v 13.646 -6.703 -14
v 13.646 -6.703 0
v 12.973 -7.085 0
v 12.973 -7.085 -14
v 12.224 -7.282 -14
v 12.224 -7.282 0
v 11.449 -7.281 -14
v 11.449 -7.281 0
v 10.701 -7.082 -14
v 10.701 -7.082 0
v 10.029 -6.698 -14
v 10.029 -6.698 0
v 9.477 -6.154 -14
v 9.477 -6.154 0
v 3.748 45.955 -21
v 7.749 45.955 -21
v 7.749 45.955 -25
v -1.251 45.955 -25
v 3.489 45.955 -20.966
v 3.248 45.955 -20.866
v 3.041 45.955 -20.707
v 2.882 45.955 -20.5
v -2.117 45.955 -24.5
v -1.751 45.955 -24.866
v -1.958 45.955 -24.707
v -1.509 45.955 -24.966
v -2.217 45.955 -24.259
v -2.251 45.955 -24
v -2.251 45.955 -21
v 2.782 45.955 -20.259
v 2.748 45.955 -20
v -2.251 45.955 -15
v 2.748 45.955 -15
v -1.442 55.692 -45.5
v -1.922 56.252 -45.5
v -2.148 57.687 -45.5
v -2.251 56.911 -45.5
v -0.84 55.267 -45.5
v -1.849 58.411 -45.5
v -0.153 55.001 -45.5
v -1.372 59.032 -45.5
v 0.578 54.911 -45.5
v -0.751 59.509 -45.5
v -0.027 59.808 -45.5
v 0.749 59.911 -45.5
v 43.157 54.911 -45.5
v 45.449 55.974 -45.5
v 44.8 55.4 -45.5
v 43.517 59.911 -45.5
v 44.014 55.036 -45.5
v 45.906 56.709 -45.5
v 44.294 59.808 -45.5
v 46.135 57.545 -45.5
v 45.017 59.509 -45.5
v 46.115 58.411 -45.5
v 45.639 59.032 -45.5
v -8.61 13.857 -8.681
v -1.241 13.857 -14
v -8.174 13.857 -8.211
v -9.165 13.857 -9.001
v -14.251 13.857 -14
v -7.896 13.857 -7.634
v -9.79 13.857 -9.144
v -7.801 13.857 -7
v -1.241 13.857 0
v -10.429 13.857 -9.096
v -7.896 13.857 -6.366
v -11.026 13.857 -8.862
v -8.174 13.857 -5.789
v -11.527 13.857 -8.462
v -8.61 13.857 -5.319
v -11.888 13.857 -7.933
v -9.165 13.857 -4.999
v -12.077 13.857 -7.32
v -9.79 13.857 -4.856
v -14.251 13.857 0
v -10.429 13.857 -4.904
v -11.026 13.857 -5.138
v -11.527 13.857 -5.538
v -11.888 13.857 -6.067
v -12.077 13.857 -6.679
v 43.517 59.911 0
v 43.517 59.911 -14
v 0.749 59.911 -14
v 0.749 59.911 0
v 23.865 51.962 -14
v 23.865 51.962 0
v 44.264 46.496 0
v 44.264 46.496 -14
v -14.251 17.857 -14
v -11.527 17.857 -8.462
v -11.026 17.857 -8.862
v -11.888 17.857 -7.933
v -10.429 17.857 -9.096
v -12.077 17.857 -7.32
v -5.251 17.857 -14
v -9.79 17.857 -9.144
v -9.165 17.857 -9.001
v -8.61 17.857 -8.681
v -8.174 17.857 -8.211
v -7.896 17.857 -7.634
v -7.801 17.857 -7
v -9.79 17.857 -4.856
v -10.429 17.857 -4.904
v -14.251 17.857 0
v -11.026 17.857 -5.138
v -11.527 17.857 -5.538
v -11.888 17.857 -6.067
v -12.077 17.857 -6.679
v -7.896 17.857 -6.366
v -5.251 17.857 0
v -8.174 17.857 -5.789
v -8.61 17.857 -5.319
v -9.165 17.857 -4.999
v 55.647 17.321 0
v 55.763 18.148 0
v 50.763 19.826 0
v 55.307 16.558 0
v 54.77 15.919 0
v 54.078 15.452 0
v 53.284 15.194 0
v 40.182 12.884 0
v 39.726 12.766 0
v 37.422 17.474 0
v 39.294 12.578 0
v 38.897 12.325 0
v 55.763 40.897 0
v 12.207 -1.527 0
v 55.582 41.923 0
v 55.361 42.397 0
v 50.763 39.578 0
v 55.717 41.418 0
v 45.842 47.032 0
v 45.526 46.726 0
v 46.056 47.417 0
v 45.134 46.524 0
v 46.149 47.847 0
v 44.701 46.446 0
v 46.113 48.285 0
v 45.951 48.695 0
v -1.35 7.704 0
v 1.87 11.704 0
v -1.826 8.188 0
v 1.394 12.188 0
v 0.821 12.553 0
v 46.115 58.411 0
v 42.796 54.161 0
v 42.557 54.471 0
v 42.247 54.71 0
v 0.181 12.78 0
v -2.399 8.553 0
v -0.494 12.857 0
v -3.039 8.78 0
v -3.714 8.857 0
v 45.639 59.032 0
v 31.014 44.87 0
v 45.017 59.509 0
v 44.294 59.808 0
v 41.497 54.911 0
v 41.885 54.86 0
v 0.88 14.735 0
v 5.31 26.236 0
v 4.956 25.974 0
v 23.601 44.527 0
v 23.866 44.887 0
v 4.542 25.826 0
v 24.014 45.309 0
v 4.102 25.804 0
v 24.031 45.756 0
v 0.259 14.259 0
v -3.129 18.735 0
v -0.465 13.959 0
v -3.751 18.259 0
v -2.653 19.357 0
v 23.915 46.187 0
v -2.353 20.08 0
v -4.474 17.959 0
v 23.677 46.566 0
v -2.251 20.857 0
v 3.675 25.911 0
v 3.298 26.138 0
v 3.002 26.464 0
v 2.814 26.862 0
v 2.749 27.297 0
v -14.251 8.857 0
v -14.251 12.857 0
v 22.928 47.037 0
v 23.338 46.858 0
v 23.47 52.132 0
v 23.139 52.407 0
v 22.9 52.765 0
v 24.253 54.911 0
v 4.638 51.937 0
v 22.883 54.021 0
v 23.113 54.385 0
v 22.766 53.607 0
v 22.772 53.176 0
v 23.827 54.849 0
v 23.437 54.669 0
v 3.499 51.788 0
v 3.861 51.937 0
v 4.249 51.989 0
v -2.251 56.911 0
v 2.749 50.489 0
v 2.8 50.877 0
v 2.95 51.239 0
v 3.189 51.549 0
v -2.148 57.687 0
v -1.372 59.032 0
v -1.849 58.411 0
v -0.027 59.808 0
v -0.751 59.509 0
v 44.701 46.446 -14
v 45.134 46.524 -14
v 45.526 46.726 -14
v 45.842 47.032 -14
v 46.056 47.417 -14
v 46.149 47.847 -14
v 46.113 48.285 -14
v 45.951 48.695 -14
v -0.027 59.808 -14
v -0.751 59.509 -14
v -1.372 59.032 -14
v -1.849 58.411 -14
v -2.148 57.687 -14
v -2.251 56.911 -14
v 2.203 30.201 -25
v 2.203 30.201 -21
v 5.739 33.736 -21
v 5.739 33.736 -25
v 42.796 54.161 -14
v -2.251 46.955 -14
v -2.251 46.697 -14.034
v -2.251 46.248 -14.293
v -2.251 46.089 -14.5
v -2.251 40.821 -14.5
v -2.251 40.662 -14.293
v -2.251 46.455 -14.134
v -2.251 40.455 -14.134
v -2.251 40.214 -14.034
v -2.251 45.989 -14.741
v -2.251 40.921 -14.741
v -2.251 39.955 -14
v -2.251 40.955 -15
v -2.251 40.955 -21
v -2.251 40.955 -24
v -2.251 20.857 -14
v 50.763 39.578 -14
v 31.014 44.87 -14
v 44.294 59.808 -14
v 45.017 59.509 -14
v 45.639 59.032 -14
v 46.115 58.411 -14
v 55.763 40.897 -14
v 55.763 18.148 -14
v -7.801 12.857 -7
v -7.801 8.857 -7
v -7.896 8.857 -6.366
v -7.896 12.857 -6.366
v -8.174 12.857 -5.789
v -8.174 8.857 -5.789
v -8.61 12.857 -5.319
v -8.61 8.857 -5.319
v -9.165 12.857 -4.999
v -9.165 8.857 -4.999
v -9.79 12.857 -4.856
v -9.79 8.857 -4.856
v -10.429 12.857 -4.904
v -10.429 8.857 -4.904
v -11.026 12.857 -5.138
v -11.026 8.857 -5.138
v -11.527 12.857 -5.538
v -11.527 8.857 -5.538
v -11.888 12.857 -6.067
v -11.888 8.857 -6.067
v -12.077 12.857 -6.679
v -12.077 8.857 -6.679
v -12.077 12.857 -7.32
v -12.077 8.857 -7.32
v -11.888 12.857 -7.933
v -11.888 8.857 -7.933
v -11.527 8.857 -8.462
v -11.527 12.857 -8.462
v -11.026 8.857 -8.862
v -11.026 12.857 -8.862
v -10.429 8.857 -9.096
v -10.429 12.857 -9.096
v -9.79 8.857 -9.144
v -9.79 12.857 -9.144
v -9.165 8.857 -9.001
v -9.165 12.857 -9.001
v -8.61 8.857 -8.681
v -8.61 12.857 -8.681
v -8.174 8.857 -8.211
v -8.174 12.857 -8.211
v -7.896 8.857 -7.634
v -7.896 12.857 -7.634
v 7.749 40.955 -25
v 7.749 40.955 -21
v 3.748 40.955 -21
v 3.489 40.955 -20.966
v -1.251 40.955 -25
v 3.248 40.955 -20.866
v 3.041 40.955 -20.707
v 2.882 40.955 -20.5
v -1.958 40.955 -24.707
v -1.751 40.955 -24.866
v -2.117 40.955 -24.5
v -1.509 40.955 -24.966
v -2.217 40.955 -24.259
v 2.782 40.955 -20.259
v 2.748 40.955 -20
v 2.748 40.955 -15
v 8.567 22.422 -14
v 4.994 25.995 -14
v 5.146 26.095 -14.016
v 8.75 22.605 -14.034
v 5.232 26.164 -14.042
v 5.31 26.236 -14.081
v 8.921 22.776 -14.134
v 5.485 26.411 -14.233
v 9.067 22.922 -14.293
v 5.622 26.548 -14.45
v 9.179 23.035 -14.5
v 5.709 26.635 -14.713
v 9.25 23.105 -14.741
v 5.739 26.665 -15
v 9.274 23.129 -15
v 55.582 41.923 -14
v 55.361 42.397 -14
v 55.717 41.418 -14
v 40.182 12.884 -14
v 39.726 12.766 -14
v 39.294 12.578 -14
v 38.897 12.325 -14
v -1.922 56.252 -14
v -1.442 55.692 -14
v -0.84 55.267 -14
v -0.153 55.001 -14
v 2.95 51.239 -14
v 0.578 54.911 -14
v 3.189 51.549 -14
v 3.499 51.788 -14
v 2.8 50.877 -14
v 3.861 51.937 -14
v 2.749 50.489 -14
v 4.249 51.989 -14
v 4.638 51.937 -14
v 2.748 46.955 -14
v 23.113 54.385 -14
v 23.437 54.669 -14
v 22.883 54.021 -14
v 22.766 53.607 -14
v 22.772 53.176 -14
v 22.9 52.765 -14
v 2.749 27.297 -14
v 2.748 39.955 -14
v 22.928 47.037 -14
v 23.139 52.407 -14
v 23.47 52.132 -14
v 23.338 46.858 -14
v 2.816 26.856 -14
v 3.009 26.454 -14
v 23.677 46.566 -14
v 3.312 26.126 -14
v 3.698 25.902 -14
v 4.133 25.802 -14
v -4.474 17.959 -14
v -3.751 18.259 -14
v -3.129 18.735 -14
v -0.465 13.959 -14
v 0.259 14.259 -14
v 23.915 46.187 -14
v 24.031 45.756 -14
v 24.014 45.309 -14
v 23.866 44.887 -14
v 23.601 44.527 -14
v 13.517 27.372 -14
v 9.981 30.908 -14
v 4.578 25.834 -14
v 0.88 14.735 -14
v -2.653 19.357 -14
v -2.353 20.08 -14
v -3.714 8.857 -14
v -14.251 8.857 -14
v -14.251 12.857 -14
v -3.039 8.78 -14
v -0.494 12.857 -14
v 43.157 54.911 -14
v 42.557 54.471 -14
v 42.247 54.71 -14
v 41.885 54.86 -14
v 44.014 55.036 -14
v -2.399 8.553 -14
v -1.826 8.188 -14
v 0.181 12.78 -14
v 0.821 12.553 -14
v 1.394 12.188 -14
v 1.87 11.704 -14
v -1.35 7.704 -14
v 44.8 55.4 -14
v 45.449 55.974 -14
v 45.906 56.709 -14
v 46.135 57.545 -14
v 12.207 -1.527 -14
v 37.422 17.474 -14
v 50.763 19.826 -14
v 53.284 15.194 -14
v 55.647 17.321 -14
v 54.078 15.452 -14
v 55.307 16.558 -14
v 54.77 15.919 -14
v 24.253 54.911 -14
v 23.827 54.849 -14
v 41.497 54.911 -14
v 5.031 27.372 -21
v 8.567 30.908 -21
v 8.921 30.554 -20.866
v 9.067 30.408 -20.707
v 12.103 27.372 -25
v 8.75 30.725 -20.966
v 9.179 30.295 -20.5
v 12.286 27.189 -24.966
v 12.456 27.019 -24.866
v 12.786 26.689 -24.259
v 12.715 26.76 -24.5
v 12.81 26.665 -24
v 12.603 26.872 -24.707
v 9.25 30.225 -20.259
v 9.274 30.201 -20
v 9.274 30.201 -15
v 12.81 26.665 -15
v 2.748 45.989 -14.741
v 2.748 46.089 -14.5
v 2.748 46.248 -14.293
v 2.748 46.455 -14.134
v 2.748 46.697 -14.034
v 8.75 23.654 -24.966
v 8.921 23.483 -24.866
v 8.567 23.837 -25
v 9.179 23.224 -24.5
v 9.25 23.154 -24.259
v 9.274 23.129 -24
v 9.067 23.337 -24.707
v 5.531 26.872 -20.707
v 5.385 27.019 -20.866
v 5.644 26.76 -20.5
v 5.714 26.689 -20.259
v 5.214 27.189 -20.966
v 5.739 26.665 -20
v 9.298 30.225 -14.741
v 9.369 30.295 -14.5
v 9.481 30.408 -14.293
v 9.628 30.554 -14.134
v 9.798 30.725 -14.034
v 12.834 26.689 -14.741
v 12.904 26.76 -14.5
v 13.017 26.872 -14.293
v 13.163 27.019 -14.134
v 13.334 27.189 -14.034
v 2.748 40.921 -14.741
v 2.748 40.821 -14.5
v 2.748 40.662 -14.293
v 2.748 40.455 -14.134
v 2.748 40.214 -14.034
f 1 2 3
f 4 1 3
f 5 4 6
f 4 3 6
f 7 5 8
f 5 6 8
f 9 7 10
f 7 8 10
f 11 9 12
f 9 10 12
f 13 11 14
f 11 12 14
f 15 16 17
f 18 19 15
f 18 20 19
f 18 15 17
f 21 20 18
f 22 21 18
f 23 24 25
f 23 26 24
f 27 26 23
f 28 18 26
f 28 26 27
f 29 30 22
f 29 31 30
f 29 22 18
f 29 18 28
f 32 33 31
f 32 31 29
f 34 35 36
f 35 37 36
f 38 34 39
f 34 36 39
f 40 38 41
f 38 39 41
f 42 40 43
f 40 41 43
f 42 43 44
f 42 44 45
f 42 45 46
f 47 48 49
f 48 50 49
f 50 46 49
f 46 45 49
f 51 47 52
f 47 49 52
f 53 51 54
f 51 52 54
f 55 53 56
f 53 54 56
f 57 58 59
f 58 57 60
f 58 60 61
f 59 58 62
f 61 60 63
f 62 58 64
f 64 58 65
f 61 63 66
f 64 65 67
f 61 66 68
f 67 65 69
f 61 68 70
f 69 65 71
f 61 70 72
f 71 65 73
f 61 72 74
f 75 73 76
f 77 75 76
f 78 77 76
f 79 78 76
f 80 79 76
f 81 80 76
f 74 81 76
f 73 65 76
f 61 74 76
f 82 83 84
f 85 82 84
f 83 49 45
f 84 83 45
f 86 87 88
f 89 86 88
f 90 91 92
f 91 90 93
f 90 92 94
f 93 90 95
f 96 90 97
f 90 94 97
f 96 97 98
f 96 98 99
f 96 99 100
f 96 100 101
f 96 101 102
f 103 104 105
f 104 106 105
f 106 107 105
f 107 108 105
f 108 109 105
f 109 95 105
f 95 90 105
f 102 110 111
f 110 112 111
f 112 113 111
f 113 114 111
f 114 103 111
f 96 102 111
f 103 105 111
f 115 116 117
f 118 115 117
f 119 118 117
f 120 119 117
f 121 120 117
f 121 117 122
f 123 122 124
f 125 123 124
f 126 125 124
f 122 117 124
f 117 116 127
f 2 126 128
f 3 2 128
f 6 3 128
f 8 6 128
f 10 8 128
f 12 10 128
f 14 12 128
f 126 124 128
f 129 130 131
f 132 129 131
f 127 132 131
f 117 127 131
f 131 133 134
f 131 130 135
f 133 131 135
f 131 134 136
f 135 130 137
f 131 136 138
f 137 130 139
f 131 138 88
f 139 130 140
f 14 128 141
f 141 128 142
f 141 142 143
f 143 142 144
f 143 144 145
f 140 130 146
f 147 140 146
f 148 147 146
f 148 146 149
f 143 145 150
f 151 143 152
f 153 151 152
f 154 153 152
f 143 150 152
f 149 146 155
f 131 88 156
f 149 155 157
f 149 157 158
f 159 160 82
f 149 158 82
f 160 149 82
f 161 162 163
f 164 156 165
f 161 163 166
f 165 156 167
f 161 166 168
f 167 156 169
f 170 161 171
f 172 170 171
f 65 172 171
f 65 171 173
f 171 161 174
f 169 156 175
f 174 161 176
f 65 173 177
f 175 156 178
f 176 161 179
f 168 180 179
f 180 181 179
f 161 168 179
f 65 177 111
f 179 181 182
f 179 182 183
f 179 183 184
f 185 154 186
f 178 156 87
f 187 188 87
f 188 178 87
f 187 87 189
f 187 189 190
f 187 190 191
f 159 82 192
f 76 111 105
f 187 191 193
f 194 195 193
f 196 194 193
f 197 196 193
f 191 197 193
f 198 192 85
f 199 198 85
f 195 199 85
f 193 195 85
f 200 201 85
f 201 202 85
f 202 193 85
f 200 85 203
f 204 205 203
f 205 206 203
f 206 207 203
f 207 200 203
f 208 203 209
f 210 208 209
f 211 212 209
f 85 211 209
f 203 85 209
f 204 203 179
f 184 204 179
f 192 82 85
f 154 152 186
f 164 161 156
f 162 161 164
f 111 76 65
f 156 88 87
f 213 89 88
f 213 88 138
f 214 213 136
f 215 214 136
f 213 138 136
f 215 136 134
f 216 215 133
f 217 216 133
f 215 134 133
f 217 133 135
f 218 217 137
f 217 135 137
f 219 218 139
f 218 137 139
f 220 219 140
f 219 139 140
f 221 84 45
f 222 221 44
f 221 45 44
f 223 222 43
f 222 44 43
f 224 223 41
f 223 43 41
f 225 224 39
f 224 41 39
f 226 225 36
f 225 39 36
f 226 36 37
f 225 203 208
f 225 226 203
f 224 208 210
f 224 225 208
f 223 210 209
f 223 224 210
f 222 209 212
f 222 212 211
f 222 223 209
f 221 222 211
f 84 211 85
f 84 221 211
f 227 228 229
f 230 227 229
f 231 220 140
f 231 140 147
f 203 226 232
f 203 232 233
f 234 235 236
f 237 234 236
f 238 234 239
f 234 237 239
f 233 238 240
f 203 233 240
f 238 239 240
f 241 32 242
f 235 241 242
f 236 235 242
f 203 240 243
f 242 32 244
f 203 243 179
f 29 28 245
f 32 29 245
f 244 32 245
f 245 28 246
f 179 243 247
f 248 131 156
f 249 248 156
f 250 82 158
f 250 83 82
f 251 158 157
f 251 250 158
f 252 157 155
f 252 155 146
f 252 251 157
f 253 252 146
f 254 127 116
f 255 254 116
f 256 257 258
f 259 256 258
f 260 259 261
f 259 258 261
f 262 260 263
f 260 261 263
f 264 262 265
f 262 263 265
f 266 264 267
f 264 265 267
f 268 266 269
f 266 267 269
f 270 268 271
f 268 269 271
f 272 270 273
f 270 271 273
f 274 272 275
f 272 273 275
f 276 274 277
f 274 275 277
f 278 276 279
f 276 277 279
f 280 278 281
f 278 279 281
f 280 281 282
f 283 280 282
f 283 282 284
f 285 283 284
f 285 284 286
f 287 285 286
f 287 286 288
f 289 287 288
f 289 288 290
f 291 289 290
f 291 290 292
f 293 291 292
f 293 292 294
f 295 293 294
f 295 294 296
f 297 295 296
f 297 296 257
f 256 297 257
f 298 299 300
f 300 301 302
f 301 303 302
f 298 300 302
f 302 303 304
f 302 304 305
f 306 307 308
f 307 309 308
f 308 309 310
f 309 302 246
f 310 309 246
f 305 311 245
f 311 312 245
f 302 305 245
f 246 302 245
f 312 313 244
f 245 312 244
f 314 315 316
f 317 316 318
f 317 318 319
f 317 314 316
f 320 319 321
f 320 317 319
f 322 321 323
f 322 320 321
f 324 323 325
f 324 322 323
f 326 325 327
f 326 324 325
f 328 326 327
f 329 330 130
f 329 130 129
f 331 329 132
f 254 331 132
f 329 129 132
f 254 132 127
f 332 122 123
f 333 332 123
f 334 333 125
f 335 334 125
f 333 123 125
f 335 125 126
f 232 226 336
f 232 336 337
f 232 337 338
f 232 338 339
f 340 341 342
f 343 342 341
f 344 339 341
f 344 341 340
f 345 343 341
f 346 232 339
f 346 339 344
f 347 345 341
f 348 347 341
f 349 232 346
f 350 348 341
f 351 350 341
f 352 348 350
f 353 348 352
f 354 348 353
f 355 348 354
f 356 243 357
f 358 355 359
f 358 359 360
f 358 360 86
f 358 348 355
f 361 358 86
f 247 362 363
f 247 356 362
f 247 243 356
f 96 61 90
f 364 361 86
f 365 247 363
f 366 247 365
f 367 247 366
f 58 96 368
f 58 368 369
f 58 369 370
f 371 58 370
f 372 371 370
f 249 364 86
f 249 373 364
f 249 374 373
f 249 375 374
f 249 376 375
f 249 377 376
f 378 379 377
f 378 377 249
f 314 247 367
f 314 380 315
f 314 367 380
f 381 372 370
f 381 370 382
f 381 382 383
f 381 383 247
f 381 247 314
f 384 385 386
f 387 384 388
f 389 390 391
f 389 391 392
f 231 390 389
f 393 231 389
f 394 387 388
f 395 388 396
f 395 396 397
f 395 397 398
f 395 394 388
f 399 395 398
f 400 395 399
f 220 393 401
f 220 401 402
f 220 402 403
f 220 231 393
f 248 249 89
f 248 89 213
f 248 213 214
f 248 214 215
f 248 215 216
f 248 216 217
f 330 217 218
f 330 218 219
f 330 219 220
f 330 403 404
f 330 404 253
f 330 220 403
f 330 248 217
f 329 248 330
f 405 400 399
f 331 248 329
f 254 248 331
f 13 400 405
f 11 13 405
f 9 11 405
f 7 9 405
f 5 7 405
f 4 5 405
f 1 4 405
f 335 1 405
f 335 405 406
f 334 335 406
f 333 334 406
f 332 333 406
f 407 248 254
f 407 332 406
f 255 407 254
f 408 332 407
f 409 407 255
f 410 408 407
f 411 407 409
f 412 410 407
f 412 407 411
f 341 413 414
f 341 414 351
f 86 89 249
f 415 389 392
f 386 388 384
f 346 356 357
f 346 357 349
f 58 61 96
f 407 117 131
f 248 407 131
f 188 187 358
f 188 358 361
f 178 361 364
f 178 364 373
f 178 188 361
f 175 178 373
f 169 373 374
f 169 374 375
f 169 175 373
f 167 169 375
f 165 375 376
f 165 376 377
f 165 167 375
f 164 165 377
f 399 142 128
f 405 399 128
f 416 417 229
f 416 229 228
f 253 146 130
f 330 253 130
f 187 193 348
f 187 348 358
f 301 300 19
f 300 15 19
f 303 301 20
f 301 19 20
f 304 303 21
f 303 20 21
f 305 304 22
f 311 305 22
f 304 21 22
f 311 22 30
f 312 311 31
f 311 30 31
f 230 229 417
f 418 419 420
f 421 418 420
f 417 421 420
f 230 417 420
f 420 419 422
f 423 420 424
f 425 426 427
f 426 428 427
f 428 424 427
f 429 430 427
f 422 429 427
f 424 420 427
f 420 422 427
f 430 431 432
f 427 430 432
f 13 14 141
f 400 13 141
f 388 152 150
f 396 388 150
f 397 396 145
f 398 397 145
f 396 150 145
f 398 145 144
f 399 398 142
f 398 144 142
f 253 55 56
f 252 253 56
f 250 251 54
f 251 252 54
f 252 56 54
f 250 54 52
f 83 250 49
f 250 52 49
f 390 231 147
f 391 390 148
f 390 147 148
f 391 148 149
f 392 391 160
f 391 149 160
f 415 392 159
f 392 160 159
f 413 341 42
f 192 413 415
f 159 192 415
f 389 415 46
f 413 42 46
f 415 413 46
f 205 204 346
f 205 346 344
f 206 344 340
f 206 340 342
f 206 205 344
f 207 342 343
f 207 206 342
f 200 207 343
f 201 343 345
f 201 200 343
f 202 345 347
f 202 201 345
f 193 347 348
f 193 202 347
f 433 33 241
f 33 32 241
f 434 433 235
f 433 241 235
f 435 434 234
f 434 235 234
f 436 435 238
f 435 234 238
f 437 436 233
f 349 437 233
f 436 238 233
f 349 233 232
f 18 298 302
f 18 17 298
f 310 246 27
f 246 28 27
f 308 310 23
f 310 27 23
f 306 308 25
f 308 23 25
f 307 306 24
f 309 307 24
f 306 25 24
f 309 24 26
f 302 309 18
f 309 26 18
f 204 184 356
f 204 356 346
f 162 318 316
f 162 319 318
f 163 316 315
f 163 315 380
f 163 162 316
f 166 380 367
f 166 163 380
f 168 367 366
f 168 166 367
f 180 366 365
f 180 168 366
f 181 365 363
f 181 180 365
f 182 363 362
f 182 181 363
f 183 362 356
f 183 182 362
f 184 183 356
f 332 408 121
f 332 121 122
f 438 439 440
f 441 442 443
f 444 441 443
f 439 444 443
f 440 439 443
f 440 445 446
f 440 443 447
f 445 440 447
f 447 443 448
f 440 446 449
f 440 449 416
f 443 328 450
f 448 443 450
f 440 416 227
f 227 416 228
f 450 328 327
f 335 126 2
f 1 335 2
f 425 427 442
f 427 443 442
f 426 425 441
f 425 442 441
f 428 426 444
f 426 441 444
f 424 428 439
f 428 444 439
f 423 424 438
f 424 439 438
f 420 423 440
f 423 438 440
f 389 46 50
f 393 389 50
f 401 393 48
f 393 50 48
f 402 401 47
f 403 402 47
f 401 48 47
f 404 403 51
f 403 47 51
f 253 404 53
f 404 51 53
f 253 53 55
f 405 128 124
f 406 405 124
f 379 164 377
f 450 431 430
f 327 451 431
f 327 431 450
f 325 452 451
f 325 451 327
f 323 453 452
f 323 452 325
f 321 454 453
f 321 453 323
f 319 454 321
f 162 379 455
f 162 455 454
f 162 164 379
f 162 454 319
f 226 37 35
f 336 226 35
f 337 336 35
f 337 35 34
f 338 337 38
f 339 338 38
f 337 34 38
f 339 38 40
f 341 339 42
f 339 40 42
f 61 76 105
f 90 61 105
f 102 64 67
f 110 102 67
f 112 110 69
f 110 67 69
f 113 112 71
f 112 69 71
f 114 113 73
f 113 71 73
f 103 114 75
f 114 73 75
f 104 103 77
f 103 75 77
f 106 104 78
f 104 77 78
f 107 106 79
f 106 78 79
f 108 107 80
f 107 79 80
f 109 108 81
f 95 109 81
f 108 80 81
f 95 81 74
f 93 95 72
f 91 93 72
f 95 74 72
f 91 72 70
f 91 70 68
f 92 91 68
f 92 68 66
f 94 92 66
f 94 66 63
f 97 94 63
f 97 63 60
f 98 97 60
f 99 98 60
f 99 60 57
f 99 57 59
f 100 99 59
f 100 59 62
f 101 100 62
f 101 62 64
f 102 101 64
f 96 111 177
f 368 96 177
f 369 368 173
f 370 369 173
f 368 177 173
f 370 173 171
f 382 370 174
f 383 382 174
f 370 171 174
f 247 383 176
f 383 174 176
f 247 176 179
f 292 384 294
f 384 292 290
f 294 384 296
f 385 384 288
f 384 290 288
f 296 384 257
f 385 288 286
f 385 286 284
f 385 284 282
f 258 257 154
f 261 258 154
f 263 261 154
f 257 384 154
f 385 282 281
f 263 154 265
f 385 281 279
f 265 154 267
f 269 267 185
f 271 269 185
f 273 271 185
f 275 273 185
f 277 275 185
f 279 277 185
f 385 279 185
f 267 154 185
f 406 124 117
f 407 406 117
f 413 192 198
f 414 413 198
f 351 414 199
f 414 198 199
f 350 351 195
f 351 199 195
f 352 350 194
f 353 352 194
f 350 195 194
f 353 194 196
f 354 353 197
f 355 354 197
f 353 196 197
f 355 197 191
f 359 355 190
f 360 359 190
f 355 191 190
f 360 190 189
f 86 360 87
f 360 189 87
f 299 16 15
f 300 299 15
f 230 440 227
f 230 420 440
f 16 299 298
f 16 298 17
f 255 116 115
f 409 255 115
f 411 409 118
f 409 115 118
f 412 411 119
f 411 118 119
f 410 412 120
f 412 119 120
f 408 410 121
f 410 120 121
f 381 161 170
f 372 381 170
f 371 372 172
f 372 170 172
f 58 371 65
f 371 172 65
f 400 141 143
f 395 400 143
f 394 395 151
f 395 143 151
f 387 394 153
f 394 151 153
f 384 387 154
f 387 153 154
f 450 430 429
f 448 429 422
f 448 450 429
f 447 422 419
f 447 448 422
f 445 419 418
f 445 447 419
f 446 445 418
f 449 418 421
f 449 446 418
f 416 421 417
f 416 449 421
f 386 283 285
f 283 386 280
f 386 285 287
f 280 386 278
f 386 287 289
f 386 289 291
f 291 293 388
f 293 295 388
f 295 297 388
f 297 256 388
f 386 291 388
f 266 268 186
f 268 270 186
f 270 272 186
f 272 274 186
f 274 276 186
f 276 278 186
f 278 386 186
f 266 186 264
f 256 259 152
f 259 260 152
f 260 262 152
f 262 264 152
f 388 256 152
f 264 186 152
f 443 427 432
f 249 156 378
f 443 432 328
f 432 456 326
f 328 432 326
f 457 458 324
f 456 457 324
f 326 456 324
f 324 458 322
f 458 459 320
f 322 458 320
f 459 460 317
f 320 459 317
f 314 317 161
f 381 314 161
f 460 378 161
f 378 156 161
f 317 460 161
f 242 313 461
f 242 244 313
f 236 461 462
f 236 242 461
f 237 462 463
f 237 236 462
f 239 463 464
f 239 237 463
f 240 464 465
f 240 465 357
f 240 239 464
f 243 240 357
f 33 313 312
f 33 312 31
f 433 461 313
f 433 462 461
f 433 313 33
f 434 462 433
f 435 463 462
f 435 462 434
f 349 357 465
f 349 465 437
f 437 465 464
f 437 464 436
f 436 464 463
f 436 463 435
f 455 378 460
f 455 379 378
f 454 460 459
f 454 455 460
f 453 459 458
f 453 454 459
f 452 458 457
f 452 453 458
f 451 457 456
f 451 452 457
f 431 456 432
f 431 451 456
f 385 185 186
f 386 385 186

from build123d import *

# Parameters (mm, degrees)
BOSS_EXTRUDE1_DEPTH = 14
FILLET1_R           = 3
SKETCH2_R           = 2.149999998
CUT_EXTRUDE1_DEPTH  = 20
BOSS_EXTRUDE2_START = 31.5
BOSS_EXTRUDE2_DEPTH = 31.5
FILLET2_R           = 3
SKETCH4_W           = 4.998300131
SKETCH4_H           = 5
BOSS_EXTRUDE3_DEPTH = 7
SKETCH5_W           = 10
SKETCH5_H           = 5
BOSS_EXTRUDE4_DEPTH = 4
FILLET3_R           = 1


with BuildPart() as part:
    # Sketch1 → Boss-Extrude1 (new body)
    with BuildSketch(Plane.XY):
        with BuildLine():
            Line((-1.241250307, 13.85672555), (-14.250633986, 13.85672555))
            Line((-14.250633986, 13.85672555), (-14.250633986, 17.85672555))
            Line((-14.250633986, 17.85672555), (-5.250633986, 17.85672555))
            ThreePointArc((-5.250633986, 17.85672555), (-3.129313642, 18.735405207), (-2.250633986, 20.85672555))
            Line((-2.250633986, 20.85672555), (-2.250633986, 59.910721228))
            Line((-2.250633986, 59.910721228), (-0.250633986, 59.910721228))
            Line((-0.250633986, 59.910721228), (45.249366014, 59.910721228))
            Line((45.249366014, 59.910721228), (55.360948415, 42.396946765))
            ThreePointArc((55.360948415, 42.396946765), (55.660649682, 41.673403901), (55.762872203, 40.896946765))
            Line((55.762872203, 40.896946765), (55.762872203, 18.148173952))
            ThreePointArc((55.762872203, 18.148173952), (55.061005533, 16.219811123), (53.283816736, 15.193750693))
            Line((53.283816736, 15.193750693), (40.181909711, 12.883530985))
            ThreePointArc((40.181909711, 12.883530985), (39.506607037, 12.680287949), (38.897409174, 12.325014256))
            Line((38.897409174, 12.325014256), (13.646499049, -6.702911338))
            ThreePointArc((13.646499049, -6.702911338), (11.449475402, -7.281339392), (9.477021718, -6.153989234))
            Line((9.477021718, -6.153989234), (-1.349799491, 7.703709976))
            ThreePointArc((-1.349799491, 7.703709976), (-2.398718311, 8.553107689), (-3.713831752, 8.85672555))
            Line((-3.713831752, 8.85672555), (-14.250633986, 8.85672555))
            Line((-14.250633986, 8.85672555), (-14.250633986, 12.85672555))
            Line((-14.250633986, 12.85672555), (-3.093333978, 12.85672555))
            Line((-3.093333978, 12.85672555), (-0.493883182, 12.85672555))
            ThreePointArc((-0.493883182, 12.85672555), (0.821230258, 12.553107689), (1.870149079, 11.703709976))
            Line((1.870149079, 11.703709976), (12.207057793, -1.526929835))
            Line((12.207057793, -1.526929835), (37.422217436, 17.474055838))
            Line((37.422217436, 17.474055838), (50.762872203, 19.826373214))
            Line((50.762872203, 19.826373214), (50.762872203, 39.578259723))
            Line((50.762872203, 39.578259723), (31.01448812, 44.86982329))
            Line((31.01448812, 44.86982329), (15.607892966, 29.463228136))
            Line((15.607892966, 29.463228136), (0.880070037, 14.735405207))
            ThreePointArc((0.880070037, 14.735405207), (-0.09320001, 14.085086953), (-1.241250307, 13.85672555))
        make_face()
        with BuildLine():
            Line((45.951332722, 48.694879226), (42.79562737, 54.160721228))
            ThreePointArc((42.79562737, 54.160721228), (42.246589264, 54.709759334), (41.496589264, 54.910721228))
            Line((41.496589264, 54.910721228), (24.253494556, 54.910721228))
            ThreePointArc((24.253494556, 54.910721228), (22.766327264, 53.606510517), (23.865265988, 51.961832489))
            Line((23.865265988, 51.961832489), (44.264066048, 46.495990486))
            ThreePointArc((44.264066048, 46.495990486), (45.842324626, 47.031737082), (45.951332722, 48.694879226))
        make_face(mode=Mode.SUBTRACT)
        with BuildLine():
            Line((23.600595455, 44.526998437), (5.310026186, 26.236429168))
            ThreePointArc((5.310026186, 26.236429168), (3.675340866, 25.911270041), (2.749366014, 27.29708934))
            Line((2.749366014, 27.29708934), (2.749366014, 50.488601873))
            ThreePointArc((2.749366014, 50.488601873), (3.336223871, 51.678631883), (4.637594582, 51.937490612))
            Line((4.637594582, 51.937490612), (22.92816385, 47.036547348))
            ThreePointArc((22.92816385, 47.036547348), (23.988824022, 45.975887176), (23.600595455, 44.526998437))
        make_face(mode=Mode.SUBTRACT)
    extrude(amount=-BOSS_EXTRUDE1_DEPTH)

    # Fillet1
    fillet1_edges = [part.edges().sort_by_distance(p)[0] for p in [
        (-2.250633986, 59.910721228, -7),
        (45.249366014, 59.910721228, -7),
    ]]
    fillet(fillet1_edges, radius=FILLET1_R)

    # Sketch2 → Cut-Extrude1 (cut)
    with BuildSketch(Plane.XZ.offset(-8.85672555)):
        with Locations((-9.950633986, -6.999923237)):
            Circle(SKETCH2_R)
    extrude(amount=-CUT_EXTRUDE1_DEPTH, mode=Mode.SUBTRACT)

    # Sketch3 → Boss-Extrude2 (add)
    with BuildSketch(Plane(origin=(0, 0, -14), x_dir=(-1, 0, 0), z_dir=(0, 0, -1)).offset(BOSS_EXTRUDE2_START)):
        with BuildLine():
            Line((-43.517315207, 59.910721228), (-0.749366014, 59.910721228))
            ThreePointArc((-0.749366014, 59.910721228), (1.371954329, 59.032041572), (2.250633986, 56.910721228))
            Line((2.250633986, 56.910721228), (2.250633986, 54.910721228))
            Line((2.250633986, 54.910721228), (-48.13611736, 54.910721228))
            Line((-48.13611736, 54.910721228), (-46.115391418, 58.410721228))
            ThreePointArc((-46.115391418, 58.410721228), (-45.017315207, 59.50879744), (-43.517315207, 59.910721228))
        make_face()
    extrude(amount=-BOSS_EXTRUDE2_DEPTH)

    # Fillet2
    # the kernel refuses this fillet: 3 mm, written as the material it takes off along each edge
    with BuildSketch(Plane(origin=(-2.250633986, 54.910721228, -52.571067812), x_dir=(0, 1, 0), z_dir=(0, 0, 1))) as fillet2_piece_1:
        with BuildLine():
            CenterArc((3, -2.828427125), FILLET2_R, 109.471220634, 70.528779366)
            Line((0, -2.828427125), (-0.06, -2.828427125))
            Line((-0.06, -2.828427125), (-0.06, 0))
            Line((-0.06, 0), (0, 0.06))
            ThreePointArc((0, 0.06), (1, 0.06), (1.98, 0.056568542))
            Line((1.98, 0.056568542), (2, 0))
        make_face()
    extrude(amount=38.571067812, mode=Mode.SUBTRACT)
    with BuildSketch(Plane(origin=(48.13611736, 54.910721228, -57.946914584), x_dir=(-1, 0, 0), z_dir=(0, 0, 1))) as fillet2_piece_2:
        with BuildLine():
            CenterArc((4.978765834, -3), FILLET2_R, 90, 99.594068227)
            Line((2.020725942, -3.5), (1.961565144, -3.51))
            ThreePointArc((1.961565144, -3.51), (0.958401447, -1.78), (-0.051961524, -0.03))
            Line((-0.051961524, -0.03), (0, 0.06))
            Line((0, 0.06), (4.978765834, 0.06))
            Line((4.978765834, 0.06), (4.978765834, 0))
        make_face()
    extrude(amount=43.946914584, mode=Mode.SUBTRACT)

    # Sketch4 → Boss-Extrude3 (add)
    with BuildSketch(Plane(origin=(0, 0, -14), x_dir=(-1, 0, 0), z_dir=(0, 0, -1))):
        with Locations((-0.24851608, 43.455333299)):
            Rectangle(SKETCH4_W, SKETCH4_H)
        Polygon((-9.274118244, 30.200521226), (-5.738584338, 26.66498732), (-9.274118244, 23.129453414), (-12.80965215, 26.66498732), align=None)
    extrude(amount=BOSS_EXTRUDE3_DEPTH)

    # Sketch5 → Boss-Extrude4 (add)
    with BuildSketch(Plane(origin=(0, 0, -21), x_dir=(-1, 0, 0), z_dir=(0, 0, -1))):
        Polygon((-12.80965215, 26.66498732), (-9.274118244, 23.129453414), (-2.203050432, 30.200521226), (-5.738584338, 33.736055132), align=None)
        with Locations((-2.749366014, 43.455333299)):
            Rectangle(SKETCH5_W, SKETCH5_H)
    extrude(amount=BOSS_EXTRUDE4_DEPTH)

    # Fillet3
    fillet3_edges = [part.edges().sort_by_distance(p)[0] for p in [
        (0.248516079, 40.955333299, -14),
        (0.248516079, 45.955333299, -14),
        (2.747666145, 43.455333299, -21),
        (11.041885197, 28.432754273, -14),
        (7.506351291, 24.897220367, -14),
        (7.506351291, 28.432754273, -21),
        (-2.250633986, 43.455333299, -25),
        (11.041885197, 24.897220367, -25),
    ]]
    fillet(fillet3_edges, radius=FILLET3_R)


solid = part.part
